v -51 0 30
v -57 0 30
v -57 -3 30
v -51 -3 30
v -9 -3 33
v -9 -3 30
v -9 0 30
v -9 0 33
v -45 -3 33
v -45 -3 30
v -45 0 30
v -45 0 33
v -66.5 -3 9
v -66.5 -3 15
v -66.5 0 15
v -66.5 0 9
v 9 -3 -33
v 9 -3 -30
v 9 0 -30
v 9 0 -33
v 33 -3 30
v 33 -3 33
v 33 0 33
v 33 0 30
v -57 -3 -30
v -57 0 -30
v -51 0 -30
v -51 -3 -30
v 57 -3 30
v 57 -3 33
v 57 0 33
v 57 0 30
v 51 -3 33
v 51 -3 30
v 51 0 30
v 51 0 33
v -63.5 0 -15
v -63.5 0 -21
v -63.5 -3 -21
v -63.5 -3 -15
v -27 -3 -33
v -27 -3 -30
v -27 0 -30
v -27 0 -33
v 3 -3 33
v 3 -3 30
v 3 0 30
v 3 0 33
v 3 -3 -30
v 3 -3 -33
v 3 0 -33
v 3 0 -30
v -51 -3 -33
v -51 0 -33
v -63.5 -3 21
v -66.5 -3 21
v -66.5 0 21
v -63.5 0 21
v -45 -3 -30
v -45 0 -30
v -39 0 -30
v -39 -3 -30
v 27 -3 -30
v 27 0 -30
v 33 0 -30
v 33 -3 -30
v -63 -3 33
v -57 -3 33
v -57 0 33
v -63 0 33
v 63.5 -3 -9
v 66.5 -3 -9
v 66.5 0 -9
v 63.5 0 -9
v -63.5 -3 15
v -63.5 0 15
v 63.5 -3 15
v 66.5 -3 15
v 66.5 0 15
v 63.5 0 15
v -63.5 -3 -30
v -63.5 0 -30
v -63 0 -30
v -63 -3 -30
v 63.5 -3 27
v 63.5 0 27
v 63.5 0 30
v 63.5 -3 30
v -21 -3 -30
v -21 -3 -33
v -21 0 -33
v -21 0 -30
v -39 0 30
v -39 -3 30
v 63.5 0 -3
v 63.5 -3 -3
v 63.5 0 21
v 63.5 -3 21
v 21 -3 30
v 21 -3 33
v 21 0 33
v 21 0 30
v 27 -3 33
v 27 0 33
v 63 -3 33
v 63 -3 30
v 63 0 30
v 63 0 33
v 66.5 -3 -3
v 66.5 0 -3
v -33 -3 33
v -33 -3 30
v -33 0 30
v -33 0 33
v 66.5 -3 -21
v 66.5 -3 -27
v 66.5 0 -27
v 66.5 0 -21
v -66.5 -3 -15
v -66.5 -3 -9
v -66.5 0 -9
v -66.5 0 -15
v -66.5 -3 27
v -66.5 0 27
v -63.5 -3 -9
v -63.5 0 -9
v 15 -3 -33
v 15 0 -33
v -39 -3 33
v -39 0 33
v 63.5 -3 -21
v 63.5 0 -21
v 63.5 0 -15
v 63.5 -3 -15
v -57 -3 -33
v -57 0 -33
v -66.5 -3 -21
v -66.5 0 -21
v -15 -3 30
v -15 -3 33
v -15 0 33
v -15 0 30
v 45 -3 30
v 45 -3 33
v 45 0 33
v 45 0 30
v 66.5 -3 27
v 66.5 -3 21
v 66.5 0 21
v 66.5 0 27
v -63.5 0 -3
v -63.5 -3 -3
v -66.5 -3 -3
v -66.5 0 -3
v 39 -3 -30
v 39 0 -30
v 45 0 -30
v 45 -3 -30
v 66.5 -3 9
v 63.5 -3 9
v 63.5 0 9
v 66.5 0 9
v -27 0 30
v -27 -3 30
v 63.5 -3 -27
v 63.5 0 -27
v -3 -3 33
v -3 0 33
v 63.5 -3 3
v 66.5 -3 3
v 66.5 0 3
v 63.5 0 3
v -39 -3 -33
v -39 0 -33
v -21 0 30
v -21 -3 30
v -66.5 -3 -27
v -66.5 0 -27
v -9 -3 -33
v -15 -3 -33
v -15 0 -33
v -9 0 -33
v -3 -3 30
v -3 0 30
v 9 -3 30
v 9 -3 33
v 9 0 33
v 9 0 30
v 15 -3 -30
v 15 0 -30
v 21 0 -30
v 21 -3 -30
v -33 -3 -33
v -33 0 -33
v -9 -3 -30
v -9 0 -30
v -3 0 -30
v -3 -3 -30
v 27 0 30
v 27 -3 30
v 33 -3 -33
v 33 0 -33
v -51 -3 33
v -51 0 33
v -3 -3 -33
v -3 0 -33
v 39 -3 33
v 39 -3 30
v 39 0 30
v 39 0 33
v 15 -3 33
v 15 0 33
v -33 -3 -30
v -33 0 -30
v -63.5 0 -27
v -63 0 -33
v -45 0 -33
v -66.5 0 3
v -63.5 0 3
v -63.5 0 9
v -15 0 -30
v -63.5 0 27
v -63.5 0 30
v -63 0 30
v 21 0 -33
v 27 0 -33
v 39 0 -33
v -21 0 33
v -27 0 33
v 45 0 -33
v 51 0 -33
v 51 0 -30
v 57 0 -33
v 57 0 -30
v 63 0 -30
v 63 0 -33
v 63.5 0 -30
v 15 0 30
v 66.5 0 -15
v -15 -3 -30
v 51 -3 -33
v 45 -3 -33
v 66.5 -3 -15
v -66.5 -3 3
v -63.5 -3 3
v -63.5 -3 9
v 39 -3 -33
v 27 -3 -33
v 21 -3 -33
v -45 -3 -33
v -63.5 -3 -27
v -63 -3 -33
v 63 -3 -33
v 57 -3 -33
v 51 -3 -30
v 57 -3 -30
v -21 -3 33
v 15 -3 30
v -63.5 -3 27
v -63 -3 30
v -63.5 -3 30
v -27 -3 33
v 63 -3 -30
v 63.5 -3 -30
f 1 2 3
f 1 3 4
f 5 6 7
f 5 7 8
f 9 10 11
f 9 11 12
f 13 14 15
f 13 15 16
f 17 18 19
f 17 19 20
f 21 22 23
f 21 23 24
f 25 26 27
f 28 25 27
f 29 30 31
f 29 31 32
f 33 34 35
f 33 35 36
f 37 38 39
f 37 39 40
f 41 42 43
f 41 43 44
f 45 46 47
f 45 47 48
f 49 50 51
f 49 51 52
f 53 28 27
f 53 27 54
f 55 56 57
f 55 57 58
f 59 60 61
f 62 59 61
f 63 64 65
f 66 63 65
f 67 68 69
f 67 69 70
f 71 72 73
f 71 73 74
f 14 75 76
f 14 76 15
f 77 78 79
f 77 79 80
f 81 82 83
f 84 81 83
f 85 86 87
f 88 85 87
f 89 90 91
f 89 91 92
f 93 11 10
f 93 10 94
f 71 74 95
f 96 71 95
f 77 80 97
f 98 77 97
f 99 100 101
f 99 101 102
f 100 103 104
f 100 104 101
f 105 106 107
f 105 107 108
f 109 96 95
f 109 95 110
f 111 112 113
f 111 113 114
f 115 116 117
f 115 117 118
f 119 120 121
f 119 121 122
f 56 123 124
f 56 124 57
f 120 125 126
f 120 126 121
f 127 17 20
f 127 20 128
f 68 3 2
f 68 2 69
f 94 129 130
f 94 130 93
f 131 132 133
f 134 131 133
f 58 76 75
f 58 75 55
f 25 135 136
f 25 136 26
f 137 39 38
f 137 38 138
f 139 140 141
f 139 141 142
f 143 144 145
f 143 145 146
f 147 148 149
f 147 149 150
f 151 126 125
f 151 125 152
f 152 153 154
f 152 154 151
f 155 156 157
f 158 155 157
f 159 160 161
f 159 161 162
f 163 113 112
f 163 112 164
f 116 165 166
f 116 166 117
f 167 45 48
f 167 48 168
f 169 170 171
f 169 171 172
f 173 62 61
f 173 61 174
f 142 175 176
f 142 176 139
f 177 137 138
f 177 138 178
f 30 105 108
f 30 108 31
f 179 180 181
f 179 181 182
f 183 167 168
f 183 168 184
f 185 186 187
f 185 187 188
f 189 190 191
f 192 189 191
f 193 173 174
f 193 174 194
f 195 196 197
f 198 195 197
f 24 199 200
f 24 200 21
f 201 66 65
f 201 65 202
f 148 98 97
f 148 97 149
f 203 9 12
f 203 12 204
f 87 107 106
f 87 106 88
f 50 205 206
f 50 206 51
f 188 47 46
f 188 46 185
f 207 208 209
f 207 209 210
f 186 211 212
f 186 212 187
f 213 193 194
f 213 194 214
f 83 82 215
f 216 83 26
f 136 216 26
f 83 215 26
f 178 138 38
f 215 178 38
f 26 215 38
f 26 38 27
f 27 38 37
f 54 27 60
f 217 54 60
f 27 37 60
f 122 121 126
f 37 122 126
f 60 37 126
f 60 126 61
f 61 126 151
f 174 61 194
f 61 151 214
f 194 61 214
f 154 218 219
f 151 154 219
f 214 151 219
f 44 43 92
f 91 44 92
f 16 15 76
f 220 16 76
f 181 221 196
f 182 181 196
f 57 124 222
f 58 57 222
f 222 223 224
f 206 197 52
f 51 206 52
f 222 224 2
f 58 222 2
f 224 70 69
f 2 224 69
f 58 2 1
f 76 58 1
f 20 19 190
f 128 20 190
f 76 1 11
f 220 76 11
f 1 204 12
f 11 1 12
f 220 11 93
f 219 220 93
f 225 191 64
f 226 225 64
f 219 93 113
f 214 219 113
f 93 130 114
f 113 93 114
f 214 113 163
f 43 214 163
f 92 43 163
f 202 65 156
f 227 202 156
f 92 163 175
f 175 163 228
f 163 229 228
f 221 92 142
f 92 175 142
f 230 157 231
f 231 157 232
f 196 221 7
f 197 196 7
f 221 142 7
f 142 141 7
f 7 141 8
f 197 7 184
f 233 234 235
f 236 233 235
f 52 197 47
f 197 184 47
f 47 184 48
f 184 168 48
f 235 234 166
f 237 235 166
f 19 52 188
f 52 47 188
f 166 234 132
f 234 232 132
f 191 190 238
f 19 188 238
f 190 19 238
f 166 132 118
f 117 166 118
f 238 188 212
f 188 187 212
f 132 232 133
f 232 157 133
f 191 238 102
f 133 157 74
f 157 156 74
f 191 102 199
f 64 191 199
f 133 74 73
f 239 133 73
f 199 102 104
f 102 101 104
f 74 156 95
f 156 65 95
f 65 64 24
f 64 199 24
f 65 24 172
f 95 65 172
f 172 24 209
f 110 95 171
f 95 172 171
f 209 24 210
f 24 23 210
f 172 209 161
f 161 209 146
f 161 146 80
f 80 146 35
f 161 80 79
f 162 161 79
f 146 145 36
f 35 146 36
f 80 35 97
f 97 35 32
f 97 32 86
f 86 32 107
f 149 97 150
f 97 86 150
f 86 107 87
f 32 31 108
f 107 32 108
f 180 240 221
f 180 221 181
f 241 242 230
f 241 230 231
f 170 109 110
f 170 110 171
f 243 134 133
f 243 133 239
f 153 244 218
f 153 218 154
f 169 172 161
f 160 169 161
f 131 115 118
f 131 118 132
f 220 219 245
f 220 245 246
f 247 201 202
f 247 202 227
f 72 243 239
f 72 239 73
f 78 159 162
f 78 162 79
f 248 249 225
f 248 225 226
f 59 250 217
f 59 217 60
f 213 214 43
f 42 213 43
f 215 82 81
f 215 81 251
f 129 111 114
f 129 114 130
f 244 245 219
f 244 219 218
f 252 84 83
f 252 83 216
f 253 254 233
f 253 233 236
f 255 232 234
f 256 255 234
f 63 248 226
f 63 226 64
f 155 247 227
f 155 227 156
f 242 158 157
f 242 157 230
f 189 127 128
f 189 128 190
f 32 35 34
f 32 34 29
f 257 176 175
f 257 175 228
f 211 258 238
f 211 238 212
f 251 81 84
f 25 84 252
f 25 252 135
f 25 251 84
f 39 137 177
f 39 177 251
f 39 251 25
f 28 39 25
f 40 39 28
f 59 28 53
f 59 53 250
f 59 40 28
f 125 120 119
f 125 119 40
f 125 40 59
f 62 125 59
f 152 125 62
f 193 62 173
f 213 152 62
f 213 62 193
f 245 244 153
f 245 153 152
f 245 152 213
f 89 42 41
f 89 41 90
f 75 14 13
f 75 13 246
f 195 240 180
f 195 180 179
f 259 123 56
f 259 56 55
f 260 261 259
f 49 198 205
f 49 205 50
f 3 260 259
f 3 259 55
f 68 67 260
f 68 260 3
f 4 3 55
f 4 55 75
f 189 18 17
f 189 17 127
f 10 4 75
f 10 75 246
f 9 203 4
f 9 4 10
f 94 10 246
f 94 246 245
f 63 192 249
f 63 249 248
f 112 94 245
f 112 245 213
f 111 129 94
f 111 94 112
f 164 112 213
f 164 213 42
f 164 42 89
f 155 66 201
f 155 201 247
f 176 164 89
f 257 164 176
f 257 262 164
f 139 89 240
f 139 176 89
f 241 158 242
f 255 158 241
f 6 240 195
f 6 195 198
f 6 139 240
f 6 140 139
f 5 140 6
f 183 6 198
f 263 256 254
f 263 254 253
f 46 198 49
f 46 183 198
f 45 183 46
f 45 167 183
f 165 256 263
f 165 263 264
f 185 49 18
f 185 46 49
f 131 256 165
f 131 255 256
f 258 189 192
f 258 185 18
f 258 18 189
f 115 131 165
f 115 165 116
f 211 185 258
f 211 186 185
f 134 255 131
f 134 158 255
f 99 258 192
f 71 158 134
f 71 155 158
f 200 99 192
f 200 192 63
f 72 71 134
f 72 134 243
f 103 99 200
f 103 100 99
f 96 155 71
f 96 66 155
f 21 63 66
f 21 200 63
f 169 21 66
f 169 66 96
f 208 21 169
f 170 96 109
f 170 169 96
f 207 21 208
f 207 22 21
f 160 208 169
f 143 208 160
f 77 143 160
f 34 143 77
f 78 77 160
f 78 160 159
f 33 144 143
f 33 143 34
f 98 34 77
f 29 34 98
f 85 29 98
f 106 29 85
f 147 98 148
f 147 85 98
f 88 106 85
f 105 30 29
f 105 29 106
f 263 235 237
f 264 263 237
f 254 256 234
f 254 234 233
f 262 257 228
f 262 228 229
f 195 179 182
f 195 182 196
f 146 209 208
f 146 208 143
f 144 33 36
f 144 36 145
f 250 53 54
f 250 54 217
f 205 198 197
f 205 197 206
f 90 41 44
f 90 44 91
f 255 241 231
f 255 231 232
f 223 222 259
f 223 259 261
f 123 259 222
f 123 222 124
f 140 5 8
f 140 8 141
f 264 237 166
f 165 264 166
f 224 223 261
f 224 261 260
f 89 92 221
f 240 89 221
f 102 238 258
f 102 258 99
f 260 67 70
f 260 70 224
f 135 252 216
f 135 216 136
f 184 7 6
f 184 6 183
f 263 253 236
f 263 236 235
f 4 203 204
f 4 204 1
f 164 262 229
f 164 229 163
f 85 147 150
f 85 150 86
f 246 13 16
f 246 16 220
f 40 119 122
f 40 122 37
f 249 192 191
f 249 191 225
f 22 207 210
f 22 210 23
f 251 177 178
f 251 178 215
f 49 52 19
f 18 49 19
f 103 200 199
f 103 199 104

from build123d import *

# Parameters (mm, degrees)
F0_W     = 127
F0_H     = 60
F1_DEPTH = 3
F3_DEPTH = 3
F5_DEPTH = 3


with BuildPart() as f1:
    # F0 (on Front) → F1 (new body)
    with BuildSketch(Plane.XZ):
        Rectangle(F0_W, F0_H)
    extrude(amount=F1_DEPTH)

    # F2 (on face) → F3 (join, through all)
    with BuildSketch(Plane.XZ.offset(3)):
        Polygon((-3, 30), (0, 30), (3, 30), (3, 33), (0, 33), (-3, 33), align=None)
        Polygon((9, 30), (12, 30), (15, 30), (15, 33), (12, 33), (9, 33), align=None)
        Polygon((21, 30), (24, 30), (27, 30), (27, 33), (24, 33), (21, 33), align=None)
        Polygon((33, 30), (36, 30), (39, 30), (39, 33), (36, 33), (33, 33), align=None)
        Polygon((45, 30), (48, 30), (51, 30), (51, 33), (48, 33), (45, 33), align=None)
        Polygon((57, 30), (60, 30), (63, 30), (63, 33), (60, 33), (57, 33), align=None)
        Polygon((-36, 30), (-33, 30), (-33, 33), (-36, 33), (-39, 33), (-39, 30), align=None)
        Polygon((-63, 30), (-60, 30), (-57, 30), (-57, 33), (-60, 33), (-63, 33), align=None)
        Polygon((-45, 30), (-45, 33), (-48, 33), (-51, 33), (-51, 30), (-48, 30), align=None)
        Polygon((-27, 30), (-24, 30), (-21, 30), (-21, 33), (-24, 33), (-27, 33), align=None)
        Polygon((-15, 30), (-12, 30), (-9, 30), (-9, 33), (-12, 33), (-15, 33), align=None)
        Polygon((-9, -33), (-9, -30), (-12, -30), (-15, -30), (-15, -33), (-12, -33), align=None)
        Polygon((36, -30), (33, -30), (33, -33), (36, -33), (39, -33), (39, -30), align=None)
        Polygon((63, -30), (60, -30), (57, -30), (57, -33), (60, -33), (63, -33), align=None)
        Polygon((45, -30), (45, -33), (48, -33), (51, -33), (51, -30), (48, -30), align=None)
        Polygon((-36, -30), (-39, -30), (-39, -33), (-36, -33), (-33, -33), (-33, -30), align=None)
        Polygon((-57, -30), (-60, -30), (-63, -30), (-63, -33), (-60, -33), (-57, -33), align=None)
        Polygon((-51, -30), (-51, -33), (-48, -33), (-45, -33), (-45, -30), (-48, -30), align=None)
        Polygon((27, -30), (24, -30), (21, -30), (21, -33), (24, -33), (27, -33), align=None)
        Polygon((15, -30), (12, -30), (9, -30), (9, -33), (12, -33), (15, -33), align=None)
        Polygon((3, -30), (0, -30), (-3, -30), (-3, -33), (0, -33), (3, -33), align=None)
        Polygon((-27, -30), (-27, -33), (-24, -33), (-21, -33), (-21, -30), (-24, -30), align=None)
    extrude(amount=-F3_DEPTH)

    # F4 (on face) → F5 (join, through all)
    with BuildSketch(Plane.XZ.offset(3)):
        Polygon((-63.5, -3), (-63.5, 0), (-63.5, 3), (-66.5, 3), (-66.5, 0), (-66.5, -3), align=None)
        Polygon((-63.5, 9), (-63.5, 12), (-63.5, 15), (-66.5, 15), (-66.5, 12), (-66.5, 9), align=None)
        Polygon((-63.5, 21), (-63.5, 24), (-63.5, 27), (-66.5, 27), (-66.5, 24), (-66.5, 21), align=None)
        Polygon((-63.5, -24), (-63.5, -21), (-66.5, -21), (-66.5, -24), (-66.5, -27), (-63.5, -27), align=None)
        Polygon((-63.5, -15), (-63.5, -12), (-63.5, -9), (-66.5, -9), (-66.5, -12), (-66.5, -15), align=None)
        Polygon((66.5, 24), (66.5, 27), (63.5, 27), (63.5, 24), (63.5, 21), (66.5, 21), align=None)
        Polygon((63.5, -9), (63.5, -12), (63.5, -15), (66.5, -15), (66.5, -12), (66.5, -9), align=None)
        Polygon((63.5, -24), (63.5, -27), (66.5, -27), (66.5, -24), (66.5, -21), (63.5, -21), align=None)
        Polygon((66.5, 12), (66.5, 15), (63.5, 15), (63.5, 12), (63.5, 9), (66.5, 9), align=None)
        Polygon((63.5, 0), (63.5, -3), (66.5, -3), (66.5, 0), (66.5, 3), (63.5, 3), align=None)
    extrude(amount=-F5_DEPTH)


solid = f1.part
